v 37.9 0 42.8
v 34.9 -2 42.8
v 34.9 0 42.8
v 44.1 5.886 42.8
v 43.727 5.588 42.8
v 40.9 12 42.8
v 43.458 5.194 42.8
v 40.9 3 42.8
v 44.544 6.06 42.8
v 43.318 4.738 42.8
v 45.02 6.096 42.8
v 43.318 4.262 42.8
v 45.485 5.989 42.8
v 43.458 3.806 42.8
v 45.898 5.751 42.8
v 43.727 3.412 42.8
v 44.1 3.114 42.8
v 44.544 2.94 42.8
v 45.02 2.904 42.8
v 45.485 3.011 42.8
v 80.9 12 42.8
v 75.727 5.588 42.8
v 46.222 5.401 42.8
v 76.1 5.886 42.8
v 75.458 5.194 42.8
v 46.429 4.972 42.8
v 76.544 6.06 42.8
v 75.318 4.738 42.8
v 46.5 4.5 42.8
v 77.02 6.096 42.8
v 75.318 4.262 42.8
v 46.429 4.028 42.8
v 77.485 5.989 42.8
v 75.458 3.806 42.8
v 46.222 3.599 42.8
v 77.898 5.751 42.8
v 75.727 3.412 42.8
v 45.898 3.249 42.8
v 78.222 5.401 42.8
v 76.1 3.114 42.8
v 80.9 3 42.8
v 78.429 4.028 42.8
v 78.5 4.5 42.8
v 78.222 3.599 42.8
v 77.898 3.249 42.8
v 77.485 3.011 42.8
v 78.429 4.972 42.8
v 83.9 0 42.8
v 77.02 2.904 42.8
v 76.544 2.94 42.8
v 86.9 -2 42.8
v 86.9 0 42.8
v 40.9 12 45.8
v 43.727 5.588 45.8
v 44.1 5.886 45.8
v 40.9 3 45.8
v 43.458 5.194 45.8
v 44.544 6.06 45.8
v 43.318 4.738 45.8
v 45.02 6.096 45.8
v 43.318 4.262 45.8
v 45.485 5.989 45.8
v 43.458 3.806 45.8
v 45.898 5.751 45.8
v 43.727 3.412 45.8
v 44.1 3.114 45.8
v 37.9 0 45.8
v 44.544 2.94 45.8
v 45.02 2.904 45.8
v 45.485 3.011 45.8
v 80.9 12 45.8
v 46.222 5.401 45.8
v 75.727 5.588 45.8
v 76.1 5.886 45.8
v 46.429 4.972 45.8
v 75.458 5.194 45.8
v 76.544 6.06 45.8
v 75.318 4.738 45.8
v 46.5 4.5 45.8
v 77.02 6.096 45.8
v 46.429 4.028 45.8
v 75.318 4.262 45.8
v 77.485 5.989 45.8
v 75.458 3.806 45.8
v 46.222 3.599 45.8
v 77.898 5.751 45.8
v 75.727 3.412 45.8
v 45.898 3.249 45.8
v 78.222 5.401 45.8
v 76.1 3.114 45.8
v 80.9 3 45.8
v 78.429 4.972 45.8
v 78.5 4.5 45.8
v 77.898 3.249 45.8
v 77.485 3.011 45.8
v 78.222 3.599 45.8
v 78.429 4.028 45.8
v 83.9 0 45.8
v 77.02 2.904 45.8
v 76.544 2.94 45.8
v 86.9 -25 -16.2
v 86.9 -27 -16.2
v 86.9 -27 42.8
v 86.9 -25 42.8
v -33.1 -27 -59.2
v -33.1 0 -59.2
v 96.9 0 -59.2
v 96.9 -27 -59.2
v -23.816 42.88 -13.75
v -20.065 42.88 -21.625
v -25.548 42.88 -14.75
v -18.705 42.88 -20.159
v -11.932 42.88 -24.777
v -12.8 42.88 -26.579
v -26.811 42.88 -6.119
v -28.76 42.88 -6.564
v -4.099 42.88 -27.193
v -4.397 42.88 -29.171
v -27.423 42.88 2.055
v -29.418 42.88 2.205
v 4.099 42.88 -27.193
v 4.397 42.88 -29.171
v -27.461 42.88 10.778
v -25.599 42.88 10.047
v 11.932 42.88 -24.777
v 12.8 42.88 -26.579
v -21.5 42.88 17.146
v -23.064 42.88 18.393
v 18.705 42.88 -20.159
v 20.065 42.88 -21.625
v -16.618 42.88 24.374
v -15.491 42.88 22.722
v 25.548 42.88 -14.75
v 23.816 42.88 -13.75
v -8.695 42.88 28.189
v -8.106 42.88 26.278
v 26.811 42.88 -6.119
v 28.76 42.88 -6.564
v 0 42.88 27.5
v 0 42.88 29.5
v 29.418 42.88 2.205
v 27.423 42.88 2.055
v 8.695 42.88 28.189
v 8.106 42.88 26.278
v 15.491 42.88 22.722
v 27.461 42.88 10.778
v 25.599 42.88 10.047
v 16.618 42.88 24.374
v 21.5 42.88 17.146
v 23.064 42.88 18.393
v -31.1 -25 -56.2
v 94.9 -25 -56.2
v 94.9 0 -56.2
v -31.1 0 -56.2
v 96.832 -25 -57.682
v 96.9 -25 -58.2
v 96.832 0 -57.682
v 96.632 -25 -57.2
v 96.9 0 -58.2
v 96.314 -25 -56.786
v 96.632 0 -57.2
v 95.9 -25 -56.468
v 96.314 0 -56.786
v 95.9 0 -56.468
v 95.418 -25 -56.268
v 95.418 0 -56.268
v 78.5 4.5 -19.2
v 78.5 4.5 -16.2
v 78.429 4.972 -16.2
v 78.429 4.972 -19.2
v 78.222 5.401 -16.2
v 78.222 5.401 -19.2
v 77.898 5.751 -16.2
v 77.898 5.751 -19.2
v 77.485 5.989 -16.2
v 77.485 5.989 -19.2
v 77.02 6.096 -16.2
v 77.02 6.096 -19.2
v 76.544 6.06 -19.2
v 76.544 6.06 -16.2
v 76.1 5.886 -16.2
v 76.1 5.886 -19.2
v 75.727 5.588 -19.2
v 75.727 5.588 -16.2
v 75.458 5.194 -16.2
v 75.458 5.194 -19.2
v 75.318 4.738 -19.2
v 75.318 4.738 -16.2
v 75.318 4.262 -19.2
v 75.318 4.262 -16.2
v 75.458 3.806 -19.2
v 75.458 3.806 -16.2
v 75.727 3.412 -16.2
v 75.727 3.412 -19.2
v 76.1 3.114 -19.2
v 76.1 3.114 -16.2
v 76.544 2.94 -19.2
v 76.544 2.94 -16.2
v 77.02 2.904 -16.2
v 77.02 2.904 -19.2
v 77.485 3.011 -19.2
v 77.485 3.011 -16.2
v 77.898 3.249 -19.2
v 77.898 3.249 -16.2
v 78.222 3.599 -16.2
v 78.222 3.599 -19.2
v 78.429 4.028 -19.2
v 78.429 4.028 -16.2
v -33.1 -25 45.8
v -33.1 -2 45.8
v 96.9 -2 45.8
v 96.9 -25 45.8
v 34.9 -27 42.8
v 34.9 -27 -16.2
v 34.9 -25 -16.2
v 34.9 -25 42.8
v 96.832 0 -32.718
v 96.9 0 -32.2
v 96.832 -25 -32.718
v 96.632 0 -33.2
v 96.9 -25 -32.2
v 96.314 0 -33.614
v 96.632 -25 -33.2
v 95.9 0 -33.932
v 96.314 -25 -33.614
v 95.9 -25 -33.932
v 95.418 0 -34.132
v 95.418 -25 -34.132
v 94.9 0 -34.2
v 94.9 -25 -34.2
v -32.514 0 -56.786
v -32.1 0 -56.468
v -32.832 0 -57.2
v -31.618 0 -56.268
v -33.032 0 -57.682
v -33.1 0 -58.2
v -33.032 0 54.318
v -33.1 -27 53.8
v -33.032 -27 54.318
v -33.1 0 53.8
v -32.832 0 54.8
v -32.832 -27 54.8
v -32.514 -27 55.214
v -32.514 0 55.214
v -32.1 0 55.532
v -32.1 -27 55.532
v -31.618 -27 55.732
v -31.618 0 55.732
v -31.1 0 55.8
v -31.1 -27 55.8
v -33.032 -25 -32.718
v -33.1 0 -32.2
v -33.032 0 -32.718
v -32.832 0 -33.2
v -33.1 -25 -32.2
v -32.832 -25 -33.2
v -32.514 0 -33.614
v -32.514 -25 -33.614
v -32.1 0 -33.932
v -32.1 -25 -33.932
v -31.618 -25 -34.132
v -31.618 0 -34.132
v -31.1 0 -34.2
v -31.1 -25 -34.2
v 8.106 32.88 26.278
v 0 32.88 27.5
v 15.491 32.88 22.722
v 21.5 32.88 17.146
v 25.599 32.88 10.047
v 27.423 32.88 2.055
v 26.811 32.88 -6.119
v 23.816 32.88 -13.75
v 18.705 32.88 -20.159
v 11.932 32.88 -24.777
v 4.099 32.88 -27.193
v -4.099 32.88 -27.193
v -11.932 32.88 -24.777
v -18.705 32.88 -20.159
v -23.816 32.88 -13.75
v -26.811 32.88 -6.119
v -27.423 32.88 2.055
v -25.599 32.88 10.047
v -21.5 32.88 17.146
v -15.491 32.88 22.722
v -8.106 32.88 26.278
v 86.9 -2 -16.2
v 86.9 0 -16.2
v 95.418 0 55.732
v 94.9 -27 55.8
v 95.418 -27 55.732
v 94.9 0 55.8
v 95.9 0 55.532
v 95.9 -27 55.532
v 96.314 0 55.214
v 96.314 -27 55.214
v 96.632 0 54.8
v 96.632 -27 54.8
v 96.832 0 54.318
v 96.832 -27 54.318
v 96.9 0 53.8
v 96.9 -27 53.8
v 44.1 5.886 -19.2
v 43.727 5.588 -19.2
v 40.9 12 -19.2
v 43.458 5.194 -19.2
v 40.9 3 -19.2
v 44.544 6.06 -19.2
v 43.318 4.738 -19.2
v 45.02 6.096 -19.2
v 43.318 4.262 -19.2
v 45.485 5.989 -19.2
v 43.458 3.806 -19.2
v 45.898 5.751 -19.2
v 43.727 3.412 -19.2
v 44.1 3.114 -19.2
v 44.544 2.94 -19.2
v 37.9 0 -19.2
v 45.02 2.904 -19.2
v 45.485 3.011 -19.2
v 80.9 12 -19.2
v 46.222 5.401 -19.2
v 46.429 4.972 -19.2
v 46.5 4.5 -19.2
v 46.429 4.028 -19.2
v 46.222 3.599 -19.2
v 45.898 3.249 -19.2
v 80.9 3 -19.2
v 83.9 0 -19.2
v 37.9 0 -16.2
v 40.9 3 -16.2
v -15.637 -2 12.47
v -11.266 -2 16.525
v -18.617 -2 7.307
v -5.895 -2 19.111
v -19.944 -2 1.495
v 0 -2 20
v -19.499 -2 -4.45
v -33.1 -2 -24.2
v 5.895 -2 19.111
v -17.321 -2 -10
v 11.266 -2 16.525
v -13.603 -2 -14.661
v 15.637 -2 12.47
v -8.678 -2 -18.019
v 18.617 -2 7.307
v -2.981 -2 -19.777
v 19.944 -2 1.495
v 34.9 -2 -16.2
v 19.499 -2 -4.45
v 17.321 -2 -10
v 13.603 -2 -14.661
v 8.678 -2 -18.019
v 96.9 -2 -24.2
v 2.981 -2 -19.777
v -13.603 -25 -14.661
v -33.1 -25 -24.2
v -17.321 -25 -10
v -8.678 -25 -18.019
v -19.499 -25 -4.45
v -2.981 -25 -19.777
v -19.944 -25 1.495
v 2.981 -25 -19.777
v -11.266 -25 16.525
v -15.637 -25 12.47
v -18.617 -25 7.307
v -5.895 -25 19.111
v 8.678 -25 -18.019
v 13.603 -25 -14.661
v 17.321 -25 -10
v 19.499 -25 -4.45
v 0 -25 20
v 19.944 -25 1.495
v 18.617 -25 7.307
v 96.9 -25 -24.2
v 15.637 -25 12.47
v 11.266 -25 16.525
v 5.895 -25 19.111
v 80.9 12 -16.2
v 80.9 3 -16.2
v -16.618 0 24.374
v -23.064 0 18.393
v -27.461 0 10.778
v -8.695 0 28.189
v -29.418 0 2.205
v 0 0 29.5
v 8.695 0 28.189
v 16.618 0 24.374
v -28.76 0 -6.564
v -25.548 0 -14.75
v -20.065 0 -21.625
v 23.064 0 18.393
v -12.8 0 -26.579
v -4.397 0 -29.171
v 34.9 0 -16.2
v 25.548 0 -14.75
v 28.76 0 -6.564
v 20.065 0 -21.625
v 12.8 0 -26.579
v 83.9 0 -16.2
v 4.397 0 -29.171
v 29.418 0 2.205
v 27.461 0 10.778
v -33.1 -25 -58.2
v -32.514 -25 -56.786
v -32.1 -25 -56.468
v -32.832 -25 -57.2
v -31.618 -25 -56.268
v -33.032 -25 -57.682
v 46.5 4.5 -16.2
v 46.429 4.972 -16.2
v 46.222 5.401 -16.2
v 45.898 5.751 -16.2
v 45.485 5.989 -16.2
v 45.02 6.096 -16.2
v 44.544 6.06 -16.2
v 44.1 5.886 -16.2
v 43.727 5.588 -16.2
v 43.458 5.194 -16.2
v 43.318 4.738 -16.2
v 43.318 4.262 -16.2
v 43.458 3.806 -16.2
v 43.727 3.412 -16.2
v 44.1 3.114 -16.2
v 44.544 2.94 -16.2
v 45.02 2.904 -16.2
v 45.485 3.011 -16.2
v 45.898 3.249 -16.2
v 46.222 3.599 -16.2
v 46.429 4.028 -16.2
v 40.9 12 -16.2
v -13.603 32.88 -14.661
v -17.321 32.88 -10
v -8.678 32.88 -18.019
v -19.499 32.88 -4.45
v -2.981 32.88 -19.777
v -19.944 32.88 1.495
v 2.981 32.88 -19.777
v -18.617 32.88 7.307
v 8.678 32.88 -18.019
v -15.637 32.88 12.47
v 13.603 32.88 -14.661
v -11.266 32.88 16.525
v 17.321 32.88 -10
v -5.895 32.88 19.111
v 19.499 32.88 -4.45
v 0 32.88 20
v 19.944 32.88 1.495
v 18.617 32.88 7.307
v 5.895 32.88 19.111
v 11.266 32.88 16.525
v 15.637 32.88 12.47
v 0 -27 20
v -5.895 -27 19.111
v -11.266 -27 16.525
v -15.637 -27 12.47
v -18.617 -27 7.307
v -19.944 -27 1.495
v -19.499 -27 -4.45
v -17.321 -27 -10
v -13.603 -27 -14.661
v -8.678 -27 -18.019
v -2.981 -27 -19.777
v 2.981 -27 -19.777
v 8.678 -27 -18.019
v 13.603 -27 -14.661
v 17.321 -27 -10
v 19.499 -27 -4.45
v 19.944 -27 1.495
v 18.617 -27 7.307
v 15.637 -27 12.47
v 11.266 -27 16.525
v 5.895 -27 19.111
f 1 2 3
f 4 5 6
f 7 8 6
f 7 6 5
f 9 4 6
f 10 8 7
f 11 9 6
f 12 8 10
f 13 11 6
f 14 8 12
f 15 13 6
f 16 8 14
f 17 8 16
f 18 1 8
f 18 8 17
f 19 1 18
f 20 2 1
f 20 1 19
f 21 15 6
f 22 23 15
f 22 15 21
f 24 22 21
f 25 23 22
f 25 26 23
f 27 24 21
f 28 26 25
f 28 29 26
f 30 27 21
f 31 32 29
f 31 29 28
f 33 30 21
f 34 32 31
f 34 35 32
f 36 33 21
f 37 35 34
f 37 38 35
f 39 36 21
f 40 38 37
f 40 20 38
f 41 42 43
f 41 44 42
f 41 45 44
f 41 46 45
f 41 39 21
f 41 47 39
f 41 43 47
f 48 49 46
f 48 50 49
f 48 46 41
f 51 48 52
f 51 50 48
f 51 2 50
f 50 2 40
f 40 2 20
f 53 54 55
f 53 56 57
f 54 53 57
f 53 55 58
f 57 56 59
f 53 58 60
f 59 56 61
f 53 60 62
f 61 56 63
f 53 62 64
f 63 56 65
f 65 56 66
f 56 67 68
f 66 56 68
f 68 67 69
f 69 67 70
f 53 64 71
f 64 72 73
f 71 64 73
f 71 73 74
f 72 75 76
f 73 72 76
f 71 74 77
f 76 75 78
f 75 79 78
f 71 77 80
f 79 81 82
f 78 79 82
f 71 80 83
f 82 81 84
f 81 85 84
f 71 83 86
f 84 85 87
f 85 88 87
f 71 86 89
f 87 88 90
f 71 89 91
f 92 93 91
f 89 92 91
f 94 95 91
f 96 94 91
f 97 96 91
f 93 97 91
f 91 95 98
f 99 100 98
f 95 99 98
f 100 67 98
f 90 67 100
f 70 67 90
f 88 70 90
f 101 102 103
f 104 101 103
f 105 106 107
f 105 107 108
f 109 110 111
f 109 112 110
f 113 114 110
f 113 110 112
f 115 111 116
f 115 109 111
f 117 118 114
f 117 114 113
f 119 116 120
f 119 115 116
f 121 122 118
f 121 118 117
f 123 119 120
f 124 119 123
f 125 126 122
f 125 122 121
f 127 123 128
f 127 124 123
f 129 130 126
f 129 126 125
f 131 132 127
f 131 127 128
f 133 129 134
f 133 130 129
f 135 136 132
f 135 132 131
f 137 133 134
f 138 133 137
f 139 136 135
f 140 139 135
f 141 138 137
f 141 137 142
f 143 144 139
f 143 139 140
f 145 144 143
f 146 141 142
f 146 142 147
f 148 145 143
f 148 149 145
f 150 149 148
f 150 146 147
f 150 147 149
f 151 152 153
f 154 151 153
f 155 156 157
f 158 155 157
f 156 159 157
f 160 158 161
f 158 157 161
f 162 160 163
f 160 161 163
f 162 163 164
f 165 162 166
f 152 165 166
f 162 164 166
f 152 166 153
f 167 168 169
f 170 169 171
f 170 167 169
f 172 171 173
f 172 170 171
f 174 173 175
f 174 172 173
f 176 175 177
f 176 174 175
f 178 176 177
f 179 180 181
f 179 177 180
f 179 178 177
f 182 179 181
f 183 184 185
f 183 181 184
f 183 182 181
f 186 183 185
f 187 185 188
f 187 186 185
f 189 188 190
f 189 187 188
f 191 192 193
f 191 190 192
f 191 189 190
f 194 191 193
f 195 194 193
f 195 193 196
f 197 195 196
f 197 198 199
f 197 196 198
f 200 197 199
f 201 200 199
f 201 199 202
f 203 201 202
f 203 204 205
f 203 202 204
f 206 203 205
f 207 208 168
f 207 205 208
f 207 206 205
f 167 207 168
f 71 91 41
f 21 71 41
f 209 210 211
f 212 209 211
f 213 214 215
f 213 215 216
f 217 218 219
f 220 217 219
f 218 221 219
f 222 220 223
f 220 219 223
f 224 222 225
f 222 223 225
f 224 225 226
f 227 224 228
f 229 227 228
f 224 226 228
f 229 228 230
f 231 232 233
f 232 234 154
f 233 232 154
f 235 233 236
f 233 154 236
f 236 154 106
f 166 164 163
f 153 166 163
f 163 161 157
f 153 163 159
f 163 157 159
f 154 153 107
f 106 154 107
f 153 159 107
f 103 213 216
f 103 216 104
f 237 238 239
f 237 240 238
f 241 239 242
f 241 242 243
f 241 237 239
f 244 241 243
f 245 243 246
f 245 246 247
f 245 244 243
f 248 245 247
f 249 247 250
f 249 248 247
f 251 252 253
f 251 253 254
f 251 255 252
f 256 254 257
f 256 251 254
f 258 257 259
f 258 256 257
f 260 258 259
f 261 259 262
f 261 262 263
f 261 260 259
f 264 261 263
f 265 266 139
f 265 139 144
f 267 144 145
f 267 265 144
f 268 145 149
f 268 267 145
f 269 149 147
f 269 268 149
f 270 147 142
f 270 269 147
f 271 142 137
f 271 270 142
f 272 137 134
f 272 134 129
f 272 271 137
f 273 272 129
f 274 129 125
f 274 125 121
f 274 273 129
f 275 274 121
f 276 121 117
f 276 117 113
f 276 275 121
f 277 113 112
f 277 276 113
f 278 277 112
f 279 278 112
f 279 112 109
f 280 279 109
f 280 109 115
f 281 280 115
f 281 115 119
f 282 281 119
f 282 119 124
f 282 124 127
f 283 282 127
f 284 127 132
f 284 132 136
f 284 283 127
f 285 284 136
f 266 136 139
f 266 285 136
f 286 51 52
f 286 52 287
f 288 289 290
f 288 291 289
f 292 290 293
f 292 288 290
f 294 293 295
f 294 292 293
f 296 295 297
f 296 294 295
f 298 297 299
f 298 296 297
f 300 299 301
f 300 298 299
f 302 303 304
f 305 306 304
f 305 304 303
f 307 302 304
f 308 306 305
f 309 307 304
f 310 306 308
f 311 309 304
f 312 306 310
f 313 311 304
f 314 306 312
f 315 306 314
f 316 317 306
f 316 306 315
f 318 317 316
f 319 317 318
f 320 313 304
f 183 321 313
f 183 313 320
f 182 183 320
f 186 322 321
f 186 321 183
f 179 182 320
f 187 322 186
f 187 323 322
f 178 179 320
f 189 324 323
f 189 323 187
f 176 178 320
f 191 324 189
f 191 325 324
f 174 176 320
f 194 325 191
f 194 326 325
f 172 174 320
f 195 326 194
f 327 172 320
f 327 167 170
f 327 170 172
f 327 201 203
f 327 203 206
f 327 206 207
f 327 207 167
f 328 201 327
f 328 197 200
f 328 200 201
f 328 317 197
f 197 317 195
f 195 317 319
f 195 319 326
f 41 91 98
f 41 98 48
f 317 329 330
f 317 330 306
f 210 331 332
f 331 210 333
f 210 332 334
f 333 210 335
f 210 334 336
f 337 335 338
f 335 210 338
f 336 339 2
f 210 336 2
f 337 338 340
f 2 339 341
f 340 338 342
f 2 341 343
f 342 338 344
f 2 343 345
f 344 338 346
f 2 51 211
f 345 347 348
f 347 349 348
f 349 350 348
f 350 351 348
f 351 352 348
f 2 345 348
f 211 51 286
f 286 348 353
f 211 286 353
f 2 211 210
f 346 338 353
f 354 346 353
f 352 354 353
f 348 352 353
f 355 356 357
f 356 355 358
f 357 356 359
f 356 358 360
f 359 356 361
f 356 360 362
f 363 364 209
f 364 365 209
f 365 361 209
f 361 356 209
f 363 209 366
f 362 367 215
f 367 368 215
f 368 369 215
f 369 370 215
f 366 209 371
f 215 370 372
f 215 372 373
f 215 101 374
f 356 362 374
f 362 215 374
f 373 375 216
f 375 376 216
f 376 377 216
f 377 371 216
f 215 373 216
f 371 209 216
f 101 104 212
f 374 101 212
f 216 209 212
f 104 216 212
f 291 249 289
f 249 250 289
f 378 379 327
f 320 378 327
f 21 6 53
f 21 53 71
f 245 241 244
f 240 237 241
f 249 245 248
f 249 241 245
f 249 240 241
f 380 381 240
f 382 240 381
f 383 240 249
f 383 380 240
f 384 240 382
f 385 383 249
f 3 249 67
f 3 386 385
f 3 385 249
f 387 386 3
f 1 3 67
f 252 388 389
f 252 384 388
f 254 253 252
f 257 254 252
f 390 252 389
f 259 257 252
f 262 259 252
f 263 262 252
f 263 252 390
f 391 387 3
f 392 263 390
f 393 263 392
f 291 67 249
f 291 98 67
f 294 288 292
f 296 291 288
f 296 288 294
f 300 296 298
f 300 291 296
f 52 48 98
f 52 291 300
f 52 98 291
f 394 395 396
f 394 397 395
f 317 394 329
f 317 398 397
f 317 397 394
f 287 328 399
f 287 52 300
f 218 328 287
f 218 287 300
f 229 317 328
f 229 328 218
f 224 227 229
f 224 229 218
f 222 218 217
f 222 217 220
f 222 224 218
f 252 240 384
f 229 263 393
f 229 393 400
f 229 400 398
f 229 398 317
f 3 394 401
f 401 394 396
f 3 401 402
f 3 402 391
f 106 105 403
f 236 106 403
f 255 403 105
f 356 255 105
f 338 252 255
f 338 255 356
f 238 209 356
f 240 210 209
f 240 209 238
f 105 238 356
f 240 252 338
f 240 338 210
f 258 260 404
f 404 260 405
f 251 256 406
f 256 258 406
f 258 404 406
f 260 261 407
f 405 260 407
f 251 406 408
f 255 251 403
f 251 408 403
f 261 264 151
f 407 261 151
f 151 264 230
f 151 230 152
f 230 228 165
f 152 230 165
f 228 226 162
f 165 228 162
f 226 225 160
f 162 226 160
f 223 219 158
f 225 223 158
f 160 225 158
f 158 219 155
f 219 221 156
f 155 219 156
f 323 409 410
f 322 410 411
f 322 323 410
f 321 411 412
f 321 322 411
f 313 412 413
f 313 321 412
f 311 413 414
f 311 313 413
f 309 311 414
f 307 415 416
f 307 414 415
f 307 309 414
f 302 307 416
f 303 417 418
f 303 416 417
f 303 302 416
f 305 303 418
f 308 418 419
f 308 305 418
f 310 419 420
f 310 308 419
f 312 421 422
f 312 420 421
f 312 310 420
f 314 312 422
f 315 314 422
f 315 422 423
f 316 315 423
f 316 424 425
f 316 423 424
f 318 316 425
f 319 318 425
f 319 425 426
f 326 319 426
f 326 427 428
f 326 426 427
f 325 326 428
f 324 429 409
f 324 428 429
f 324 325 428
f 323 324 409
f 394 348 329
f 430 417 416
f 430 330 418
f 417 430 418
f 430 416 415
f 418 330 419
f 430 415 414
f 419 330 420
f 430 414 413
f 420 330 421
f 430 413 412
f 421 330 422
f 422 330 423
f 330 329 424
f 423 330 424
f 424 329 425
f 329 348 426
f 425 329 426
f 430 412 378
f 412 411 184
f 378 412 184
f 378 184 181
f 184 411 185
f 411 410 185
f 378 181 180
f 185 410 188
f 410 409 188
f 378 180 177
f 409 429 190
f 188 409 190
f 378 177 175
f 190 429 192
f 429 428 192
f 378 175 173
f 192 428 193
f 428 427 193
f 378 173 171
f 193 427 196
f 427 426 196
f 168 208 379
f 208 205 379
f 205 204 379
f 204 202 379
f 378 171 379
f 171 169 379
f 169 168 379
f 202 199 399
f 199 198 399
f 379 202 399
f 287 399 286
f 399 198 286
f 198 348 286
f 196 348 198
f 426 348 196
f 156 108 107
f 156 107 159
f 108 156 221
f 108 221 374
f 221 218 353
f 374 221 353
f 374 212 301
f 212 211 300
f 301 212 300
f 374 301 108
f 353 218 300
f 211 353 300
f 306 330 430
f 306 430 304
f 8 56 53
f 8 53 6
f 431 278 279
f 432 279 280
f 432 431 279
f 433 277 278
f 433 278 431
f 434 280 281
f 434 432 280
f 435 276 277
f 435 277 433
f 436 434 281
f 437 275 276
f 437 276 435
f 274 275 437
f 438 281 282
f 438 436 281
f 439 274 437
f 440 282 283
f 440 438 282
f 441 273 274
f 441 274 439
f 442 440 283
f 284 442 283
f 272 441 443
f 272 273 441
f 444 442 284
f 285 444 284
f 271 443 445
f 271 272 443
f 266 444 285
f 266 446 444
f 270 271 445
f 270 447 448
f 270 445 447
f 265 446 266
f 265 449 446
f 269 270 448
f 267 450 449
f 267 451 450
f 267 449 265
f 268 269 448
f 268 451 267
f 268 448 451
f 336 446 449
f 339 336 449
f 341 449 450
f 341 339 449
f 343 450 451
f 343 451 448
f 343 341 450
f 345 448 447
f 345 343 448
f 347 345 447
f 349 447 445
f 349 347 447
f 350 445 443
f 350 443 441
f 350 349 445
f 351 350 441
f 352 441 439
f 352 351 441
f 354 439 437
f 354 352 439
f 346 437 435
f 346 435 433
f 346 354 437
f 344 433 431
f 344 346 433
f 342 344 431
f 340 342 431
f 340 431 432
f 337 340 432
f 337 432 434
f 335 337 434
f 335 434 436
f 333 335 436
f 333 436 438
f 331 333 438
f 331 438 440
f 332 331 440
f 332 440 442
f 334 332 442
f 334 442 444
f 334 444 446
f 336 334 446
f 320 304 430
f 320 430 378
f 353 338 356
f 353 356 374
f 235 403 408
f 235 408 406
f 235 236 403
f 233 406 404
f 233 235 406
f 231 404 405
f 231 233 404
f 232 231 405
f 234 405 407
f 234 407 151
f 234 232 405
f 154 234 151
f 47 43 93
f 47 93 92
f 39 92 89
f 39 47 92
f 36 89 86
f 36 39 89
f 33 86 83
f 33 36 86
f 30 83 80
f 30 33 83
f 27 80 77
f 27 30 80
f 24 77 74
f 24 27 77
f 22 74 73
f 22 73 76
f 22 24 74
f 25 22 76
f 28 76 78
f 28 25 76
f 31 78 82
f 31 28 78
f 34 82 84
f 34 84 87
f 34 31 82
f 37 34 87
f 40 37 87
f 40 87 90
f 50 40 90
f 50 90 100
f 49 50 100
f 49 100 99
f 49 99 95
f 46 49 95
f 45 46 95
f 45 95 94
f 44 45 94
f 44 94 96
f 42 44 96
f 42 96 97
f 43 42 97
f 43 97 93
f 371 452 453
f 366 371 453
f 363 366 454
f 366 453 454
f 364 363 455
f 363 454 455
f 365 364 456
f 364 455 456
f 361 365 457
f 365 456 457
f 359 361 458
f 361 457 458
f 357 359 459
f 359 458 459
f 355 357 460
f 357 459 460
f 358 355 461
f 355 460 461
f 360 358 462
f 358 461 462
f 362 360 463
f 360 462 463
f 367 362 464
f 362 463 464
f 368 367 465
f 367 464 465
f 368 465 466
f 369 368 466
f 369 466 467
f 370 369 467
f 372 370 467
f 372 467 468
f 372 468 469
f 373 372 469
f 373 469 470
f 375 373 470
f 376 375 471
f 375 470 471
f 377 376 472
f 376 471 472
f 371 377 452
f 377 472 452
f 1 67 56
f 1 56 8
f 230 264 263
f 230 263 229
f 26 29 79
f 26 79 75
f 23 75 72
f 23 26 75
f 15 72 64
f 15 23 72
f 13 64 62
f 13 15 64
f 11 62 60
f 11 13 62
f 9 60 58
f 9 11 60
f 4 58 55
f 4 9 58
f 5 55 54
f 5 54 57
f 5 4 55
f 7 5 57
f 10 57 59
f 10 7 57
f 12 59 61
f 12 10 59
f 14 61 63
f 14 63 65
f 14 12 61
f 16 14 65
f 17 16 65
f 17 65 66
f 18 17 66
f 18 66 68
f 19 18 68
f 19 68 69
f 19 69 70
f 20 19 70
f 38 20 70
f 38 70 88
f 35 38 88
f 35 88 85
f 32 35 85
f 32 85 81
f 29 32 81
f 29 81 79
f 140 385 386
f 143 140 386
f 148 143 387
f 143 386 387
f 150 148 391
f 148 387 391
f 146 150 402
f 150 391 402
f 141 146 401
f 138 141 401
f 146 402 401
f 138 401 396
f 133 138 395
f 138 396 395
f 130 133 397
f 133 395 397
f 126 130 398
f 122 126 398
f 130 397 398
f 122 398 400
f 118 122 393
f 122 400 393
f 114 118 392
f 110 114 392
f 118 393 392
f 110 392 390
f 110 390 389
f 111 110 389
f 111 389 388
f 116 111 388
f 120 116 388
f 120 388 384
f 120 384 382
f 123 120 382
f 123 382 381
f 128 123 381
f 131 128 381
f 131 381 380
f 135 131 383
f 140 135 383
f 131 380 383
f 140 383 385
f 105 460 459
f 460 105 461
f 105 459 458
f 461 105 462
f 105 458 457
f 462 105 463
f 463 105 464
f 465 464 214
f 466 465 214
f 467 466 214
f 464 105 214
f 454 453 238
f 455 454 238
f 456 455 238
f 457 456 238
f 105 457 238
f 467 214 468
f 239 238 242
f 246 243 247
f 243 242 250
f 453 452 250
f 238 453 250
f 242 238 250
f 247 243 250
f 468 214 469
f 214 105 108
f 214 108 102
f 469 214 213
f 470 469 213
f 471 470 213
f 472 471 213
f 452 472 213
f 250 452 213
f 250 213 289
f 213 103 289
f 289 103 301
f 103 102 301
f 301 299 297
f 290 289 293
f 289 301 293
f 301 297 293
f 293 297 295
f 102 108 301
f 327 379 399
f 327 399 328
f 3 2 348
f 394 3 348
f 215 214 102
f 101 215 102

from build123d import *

# Parameters (mm, degrees)
SKETCH1_R             = 29.5
SKETCH1_R_2           = 20
BOSS_EXTRUDE1_DEPTH   = 42.88
CUT_EXTRUDE1_START    = -10
SKETCH2_R             = 27.5
SKETCH2_R_2           = 20
CUT_EXTRUDE1_DEPTH    = 10
SKETCH4_W             = 40
SKETCH4_H             = 3
BOSS_EXTRUDE2_DEPTH   = 12
BOSS_EXTRUDE2_2_DEPTH = 12
CUT_EXTRUDE2_START    = -65
SKETCH5_R             = 1.6
CUT_EXTRUDE2_DEPTH    = 65
BOSS_EXTRUDE3_START   = -2
SKETCH6_W             = 130
SKETCH6_H             = 90
SKETCH6_R             = 20
SKETCH6_W_2           = 52
SKETCH6_H_2           = 59
BOSS_EXTRUDE3_DEPTH   = 2
SKETCH8_W             = 130
SKETCH8_H             = 10
BOSS_EXTRUDE4_DEPTH   = 23
BOSS_EXTRUDE5_START   = 2
SKETCH9_W             = 130
SKETCH9_H             = 90
SKETCH9_R             = 20
SKETCH9_W_2           = 52
SKETCH9_H_2           = 59
BOSS_EXTRUDE5_DEPTH   = 2
CHAMFER1_SIZE         = 3
BOSS_EXTRUDE6_DEPTH   = 130
FILLET1_R             = 2


with BuildPart() as part:
    # Sketch1 → Boss-Extrude1 (new body)
    with BuildSketch(Plane(origin=(0, 0, 0), x_dir=(1, 0, 0), z_dir=(0, 1, 0))):
        with Locations(Location((0, 0, 0), (0, 0, 270))):
            Circle(SKETCH1_R)
        with Locations(Location((0, 0, 0), (0, 0, 270))):
            Circle(SKETCH1_R_2, mode=Mode.SUBTRACT)
    extrude(amount=BOSS_EXTRUDE1_DEPTH)

    # Sketch2 → Cut-Extrude1 (cut)
    with BuildSketch(Plane(origin=(0, 42.88, 0), x_dir=(1, 0, 0), z_dir=(0, 1, 0)).offset(CUT_EXTRUDE1_START)):
        with Locations(Location((0, 0, 0), (0, 0, 270))):
            Circle(SKETCH2_R)
        with Locations(Location((0, 0, 0), (0, 0, 270))):
            Circle(SKETCH2_R_2, mode=Mode.SUBTRACT)
    extrude(amount=CUT_EXTRUDE1_DEPTH, mode=Mode.SUBTRACT)



with BuildPart() as body_2:
    # Sketch4 → Boss-Extrude2 (new body)
    with BuildSketch(Plane(origin=(0, 0, 0), x_dir=(1, 0, 0), z_dir=(0, 1, 0))):
        with Locations((60.9, 17.7)):
            Rectangle(SKETCH4_W, SKETCH4_H)
    extrude(amount=BOSS_EXTRUDE2_DEPTH)


with BuildPart() as body_3:
    # Sketch4 → Boss-Extrude2 2 (new body)
    with BuildSketch(Plane(origin=(0, 0, 0), x_dir=(1, 0, 0), z_dir=(0, 1, 0))):
        with Locations((60.9, -44.3)):
            Rectangle(SKETCH4_W, SKETCH4_H)
    extrude(amount=BOSS_EXTRUDE2_2_DEPTH)


with BuildPart() as cut_extrude2_tool:
    # Sketch5 → Cut-Extrude2 (new body)
    with BuildSketch(Plane.XY.offset(45.8).offset(CUT_EXTRUDE2_START)):
        with Locations((44.9, 4.5)):
            Circle(SKETCH5_R)
        with Locations((76.9, 4.5)):
            Circle(SKETCH5_R)
    extrude(amount=CUT_EXTRUDE2_DEPTH)


with BuildPart() as body_2_1:
    add(body_2.part)

    # Cut-Extrude2: cut by cut_extrude2_tool
    add(cut_extrude2_tool.part, mode=Mode.SUBTRACT)


with BuildPart() as body_3_1:
    add(body_3.part)

    # Cut-Extrude2: cut by cut_extrude2_tool
    add(cut_extrude2_tool.part, mode=Mode.SUBTRACT)


with BuildPart() as part_1:
    add(part.part)

    add(body_2_1.part)  # Boss-Extrude3 merges body 2

    add(body_3_1.part)  # Boss-Extrude3 merges body 3
    # Sketch6 → Boss-Extrude3 (add)
    with BuildSketch(Plane(origin=(0, 0, 0), x_dir=(1, 0, 0), z_dir=(0, 1, 0)).offset(BOSS_EXTRUDE3_START)):
        with Locations((31.9, -10.8)):
            Rectangle(SKETCH6_W, SKETCH6_H)
        with Locations(Location((0, 0, 0), (0, 0, 270))):
            Circle(SKETCH6_R, mode=Mode.SUBTRACT)
        with Locations((60.9, -13.3)):
            Rectangle(SKETCH6_W_2, SKETCH6_H_2, mode=Mode.SUBTRACT)
    extrude(amount=BOSS_EXTRUDE3_DEPTH)

    # Sketch8 → Boss-Extrude4 (add)
    with BuildSketch(Plane.XZ.offset(2)):
        with Locations((31.9, 50.8)):
            Rectangle(SKETCH8_W, SKETCH8_H)
        with Locations((31.9, -29.2)):
            Rectangle(SKETCH8_W, SKETCH8_H)
    extrude(amount=BOSS_EXTRUDE4_DEPTH)

    # Sketch9 → Boss-Extrude5 (add)
    with BuildSketch(Plane.XZ.offset(25).offset(BOSS_EXTRUDE5_START)):
        with Locations((31.9, 10.8)):
            Rectangle(SKETCH9_W, SKETCH9_H)
        with Locations(Location((0, 0, 0), (0, 0, 90))):
            Circle(SKETCH9_R, mode=Mode.SUBTRACT)
        with Locations((60.9, 13.3)):
            Rectangle(SKETCH9_W_2, SKETCH9_H_2, mode=Mode.SUBTRACT)
    extrude(amount=-BOSS_EXTRUDE5_DEPTH)

    # Chamfer1
    chamfer1_edges = [part_1.edges().sort_by_distance(p)[0] for p in [
        (40.9, 0, -17.7),
        (80.9, 0, -17.7),
        (40.9, 0, 44.3),
        (80.9, 0, 44.3),
    ]]
    chamfer(chamfer1_edges, length=CHAMFER1_SIZE)

    # Sketch11 → Boss-Extrude6 (add)
    with BuildSketch(Plane(origin=(96.9, 0, 0), x_dir=(0, 0, -1), z_dir=(1, 0, 0))):
        Polygon((34.2, -27), (34.2, -25), (56.2, -25), (56.2, 0), (59.2, 0), (59.2, -27), align=None)
    extrude(amount=-BOSS_EXTRUDE6_DEPTH)

    # Fillet1
    fillet1_edges = [part_1.edges().sort_by_distance(p)[0] for p in [
        (96.9, -12.5, -34.2),
        (-33.1, -12.5, -34.2),
        (96.9, -12.5, -56.2),
        (-33.1, -13.5, 55.8),
        (-33.1, -12.5, -56.2),
        (96.9, -13.5, 55.8),
    ]]
    fillet(fillet1_edges, radius=FILLET1_R)


solid = part_1.part
